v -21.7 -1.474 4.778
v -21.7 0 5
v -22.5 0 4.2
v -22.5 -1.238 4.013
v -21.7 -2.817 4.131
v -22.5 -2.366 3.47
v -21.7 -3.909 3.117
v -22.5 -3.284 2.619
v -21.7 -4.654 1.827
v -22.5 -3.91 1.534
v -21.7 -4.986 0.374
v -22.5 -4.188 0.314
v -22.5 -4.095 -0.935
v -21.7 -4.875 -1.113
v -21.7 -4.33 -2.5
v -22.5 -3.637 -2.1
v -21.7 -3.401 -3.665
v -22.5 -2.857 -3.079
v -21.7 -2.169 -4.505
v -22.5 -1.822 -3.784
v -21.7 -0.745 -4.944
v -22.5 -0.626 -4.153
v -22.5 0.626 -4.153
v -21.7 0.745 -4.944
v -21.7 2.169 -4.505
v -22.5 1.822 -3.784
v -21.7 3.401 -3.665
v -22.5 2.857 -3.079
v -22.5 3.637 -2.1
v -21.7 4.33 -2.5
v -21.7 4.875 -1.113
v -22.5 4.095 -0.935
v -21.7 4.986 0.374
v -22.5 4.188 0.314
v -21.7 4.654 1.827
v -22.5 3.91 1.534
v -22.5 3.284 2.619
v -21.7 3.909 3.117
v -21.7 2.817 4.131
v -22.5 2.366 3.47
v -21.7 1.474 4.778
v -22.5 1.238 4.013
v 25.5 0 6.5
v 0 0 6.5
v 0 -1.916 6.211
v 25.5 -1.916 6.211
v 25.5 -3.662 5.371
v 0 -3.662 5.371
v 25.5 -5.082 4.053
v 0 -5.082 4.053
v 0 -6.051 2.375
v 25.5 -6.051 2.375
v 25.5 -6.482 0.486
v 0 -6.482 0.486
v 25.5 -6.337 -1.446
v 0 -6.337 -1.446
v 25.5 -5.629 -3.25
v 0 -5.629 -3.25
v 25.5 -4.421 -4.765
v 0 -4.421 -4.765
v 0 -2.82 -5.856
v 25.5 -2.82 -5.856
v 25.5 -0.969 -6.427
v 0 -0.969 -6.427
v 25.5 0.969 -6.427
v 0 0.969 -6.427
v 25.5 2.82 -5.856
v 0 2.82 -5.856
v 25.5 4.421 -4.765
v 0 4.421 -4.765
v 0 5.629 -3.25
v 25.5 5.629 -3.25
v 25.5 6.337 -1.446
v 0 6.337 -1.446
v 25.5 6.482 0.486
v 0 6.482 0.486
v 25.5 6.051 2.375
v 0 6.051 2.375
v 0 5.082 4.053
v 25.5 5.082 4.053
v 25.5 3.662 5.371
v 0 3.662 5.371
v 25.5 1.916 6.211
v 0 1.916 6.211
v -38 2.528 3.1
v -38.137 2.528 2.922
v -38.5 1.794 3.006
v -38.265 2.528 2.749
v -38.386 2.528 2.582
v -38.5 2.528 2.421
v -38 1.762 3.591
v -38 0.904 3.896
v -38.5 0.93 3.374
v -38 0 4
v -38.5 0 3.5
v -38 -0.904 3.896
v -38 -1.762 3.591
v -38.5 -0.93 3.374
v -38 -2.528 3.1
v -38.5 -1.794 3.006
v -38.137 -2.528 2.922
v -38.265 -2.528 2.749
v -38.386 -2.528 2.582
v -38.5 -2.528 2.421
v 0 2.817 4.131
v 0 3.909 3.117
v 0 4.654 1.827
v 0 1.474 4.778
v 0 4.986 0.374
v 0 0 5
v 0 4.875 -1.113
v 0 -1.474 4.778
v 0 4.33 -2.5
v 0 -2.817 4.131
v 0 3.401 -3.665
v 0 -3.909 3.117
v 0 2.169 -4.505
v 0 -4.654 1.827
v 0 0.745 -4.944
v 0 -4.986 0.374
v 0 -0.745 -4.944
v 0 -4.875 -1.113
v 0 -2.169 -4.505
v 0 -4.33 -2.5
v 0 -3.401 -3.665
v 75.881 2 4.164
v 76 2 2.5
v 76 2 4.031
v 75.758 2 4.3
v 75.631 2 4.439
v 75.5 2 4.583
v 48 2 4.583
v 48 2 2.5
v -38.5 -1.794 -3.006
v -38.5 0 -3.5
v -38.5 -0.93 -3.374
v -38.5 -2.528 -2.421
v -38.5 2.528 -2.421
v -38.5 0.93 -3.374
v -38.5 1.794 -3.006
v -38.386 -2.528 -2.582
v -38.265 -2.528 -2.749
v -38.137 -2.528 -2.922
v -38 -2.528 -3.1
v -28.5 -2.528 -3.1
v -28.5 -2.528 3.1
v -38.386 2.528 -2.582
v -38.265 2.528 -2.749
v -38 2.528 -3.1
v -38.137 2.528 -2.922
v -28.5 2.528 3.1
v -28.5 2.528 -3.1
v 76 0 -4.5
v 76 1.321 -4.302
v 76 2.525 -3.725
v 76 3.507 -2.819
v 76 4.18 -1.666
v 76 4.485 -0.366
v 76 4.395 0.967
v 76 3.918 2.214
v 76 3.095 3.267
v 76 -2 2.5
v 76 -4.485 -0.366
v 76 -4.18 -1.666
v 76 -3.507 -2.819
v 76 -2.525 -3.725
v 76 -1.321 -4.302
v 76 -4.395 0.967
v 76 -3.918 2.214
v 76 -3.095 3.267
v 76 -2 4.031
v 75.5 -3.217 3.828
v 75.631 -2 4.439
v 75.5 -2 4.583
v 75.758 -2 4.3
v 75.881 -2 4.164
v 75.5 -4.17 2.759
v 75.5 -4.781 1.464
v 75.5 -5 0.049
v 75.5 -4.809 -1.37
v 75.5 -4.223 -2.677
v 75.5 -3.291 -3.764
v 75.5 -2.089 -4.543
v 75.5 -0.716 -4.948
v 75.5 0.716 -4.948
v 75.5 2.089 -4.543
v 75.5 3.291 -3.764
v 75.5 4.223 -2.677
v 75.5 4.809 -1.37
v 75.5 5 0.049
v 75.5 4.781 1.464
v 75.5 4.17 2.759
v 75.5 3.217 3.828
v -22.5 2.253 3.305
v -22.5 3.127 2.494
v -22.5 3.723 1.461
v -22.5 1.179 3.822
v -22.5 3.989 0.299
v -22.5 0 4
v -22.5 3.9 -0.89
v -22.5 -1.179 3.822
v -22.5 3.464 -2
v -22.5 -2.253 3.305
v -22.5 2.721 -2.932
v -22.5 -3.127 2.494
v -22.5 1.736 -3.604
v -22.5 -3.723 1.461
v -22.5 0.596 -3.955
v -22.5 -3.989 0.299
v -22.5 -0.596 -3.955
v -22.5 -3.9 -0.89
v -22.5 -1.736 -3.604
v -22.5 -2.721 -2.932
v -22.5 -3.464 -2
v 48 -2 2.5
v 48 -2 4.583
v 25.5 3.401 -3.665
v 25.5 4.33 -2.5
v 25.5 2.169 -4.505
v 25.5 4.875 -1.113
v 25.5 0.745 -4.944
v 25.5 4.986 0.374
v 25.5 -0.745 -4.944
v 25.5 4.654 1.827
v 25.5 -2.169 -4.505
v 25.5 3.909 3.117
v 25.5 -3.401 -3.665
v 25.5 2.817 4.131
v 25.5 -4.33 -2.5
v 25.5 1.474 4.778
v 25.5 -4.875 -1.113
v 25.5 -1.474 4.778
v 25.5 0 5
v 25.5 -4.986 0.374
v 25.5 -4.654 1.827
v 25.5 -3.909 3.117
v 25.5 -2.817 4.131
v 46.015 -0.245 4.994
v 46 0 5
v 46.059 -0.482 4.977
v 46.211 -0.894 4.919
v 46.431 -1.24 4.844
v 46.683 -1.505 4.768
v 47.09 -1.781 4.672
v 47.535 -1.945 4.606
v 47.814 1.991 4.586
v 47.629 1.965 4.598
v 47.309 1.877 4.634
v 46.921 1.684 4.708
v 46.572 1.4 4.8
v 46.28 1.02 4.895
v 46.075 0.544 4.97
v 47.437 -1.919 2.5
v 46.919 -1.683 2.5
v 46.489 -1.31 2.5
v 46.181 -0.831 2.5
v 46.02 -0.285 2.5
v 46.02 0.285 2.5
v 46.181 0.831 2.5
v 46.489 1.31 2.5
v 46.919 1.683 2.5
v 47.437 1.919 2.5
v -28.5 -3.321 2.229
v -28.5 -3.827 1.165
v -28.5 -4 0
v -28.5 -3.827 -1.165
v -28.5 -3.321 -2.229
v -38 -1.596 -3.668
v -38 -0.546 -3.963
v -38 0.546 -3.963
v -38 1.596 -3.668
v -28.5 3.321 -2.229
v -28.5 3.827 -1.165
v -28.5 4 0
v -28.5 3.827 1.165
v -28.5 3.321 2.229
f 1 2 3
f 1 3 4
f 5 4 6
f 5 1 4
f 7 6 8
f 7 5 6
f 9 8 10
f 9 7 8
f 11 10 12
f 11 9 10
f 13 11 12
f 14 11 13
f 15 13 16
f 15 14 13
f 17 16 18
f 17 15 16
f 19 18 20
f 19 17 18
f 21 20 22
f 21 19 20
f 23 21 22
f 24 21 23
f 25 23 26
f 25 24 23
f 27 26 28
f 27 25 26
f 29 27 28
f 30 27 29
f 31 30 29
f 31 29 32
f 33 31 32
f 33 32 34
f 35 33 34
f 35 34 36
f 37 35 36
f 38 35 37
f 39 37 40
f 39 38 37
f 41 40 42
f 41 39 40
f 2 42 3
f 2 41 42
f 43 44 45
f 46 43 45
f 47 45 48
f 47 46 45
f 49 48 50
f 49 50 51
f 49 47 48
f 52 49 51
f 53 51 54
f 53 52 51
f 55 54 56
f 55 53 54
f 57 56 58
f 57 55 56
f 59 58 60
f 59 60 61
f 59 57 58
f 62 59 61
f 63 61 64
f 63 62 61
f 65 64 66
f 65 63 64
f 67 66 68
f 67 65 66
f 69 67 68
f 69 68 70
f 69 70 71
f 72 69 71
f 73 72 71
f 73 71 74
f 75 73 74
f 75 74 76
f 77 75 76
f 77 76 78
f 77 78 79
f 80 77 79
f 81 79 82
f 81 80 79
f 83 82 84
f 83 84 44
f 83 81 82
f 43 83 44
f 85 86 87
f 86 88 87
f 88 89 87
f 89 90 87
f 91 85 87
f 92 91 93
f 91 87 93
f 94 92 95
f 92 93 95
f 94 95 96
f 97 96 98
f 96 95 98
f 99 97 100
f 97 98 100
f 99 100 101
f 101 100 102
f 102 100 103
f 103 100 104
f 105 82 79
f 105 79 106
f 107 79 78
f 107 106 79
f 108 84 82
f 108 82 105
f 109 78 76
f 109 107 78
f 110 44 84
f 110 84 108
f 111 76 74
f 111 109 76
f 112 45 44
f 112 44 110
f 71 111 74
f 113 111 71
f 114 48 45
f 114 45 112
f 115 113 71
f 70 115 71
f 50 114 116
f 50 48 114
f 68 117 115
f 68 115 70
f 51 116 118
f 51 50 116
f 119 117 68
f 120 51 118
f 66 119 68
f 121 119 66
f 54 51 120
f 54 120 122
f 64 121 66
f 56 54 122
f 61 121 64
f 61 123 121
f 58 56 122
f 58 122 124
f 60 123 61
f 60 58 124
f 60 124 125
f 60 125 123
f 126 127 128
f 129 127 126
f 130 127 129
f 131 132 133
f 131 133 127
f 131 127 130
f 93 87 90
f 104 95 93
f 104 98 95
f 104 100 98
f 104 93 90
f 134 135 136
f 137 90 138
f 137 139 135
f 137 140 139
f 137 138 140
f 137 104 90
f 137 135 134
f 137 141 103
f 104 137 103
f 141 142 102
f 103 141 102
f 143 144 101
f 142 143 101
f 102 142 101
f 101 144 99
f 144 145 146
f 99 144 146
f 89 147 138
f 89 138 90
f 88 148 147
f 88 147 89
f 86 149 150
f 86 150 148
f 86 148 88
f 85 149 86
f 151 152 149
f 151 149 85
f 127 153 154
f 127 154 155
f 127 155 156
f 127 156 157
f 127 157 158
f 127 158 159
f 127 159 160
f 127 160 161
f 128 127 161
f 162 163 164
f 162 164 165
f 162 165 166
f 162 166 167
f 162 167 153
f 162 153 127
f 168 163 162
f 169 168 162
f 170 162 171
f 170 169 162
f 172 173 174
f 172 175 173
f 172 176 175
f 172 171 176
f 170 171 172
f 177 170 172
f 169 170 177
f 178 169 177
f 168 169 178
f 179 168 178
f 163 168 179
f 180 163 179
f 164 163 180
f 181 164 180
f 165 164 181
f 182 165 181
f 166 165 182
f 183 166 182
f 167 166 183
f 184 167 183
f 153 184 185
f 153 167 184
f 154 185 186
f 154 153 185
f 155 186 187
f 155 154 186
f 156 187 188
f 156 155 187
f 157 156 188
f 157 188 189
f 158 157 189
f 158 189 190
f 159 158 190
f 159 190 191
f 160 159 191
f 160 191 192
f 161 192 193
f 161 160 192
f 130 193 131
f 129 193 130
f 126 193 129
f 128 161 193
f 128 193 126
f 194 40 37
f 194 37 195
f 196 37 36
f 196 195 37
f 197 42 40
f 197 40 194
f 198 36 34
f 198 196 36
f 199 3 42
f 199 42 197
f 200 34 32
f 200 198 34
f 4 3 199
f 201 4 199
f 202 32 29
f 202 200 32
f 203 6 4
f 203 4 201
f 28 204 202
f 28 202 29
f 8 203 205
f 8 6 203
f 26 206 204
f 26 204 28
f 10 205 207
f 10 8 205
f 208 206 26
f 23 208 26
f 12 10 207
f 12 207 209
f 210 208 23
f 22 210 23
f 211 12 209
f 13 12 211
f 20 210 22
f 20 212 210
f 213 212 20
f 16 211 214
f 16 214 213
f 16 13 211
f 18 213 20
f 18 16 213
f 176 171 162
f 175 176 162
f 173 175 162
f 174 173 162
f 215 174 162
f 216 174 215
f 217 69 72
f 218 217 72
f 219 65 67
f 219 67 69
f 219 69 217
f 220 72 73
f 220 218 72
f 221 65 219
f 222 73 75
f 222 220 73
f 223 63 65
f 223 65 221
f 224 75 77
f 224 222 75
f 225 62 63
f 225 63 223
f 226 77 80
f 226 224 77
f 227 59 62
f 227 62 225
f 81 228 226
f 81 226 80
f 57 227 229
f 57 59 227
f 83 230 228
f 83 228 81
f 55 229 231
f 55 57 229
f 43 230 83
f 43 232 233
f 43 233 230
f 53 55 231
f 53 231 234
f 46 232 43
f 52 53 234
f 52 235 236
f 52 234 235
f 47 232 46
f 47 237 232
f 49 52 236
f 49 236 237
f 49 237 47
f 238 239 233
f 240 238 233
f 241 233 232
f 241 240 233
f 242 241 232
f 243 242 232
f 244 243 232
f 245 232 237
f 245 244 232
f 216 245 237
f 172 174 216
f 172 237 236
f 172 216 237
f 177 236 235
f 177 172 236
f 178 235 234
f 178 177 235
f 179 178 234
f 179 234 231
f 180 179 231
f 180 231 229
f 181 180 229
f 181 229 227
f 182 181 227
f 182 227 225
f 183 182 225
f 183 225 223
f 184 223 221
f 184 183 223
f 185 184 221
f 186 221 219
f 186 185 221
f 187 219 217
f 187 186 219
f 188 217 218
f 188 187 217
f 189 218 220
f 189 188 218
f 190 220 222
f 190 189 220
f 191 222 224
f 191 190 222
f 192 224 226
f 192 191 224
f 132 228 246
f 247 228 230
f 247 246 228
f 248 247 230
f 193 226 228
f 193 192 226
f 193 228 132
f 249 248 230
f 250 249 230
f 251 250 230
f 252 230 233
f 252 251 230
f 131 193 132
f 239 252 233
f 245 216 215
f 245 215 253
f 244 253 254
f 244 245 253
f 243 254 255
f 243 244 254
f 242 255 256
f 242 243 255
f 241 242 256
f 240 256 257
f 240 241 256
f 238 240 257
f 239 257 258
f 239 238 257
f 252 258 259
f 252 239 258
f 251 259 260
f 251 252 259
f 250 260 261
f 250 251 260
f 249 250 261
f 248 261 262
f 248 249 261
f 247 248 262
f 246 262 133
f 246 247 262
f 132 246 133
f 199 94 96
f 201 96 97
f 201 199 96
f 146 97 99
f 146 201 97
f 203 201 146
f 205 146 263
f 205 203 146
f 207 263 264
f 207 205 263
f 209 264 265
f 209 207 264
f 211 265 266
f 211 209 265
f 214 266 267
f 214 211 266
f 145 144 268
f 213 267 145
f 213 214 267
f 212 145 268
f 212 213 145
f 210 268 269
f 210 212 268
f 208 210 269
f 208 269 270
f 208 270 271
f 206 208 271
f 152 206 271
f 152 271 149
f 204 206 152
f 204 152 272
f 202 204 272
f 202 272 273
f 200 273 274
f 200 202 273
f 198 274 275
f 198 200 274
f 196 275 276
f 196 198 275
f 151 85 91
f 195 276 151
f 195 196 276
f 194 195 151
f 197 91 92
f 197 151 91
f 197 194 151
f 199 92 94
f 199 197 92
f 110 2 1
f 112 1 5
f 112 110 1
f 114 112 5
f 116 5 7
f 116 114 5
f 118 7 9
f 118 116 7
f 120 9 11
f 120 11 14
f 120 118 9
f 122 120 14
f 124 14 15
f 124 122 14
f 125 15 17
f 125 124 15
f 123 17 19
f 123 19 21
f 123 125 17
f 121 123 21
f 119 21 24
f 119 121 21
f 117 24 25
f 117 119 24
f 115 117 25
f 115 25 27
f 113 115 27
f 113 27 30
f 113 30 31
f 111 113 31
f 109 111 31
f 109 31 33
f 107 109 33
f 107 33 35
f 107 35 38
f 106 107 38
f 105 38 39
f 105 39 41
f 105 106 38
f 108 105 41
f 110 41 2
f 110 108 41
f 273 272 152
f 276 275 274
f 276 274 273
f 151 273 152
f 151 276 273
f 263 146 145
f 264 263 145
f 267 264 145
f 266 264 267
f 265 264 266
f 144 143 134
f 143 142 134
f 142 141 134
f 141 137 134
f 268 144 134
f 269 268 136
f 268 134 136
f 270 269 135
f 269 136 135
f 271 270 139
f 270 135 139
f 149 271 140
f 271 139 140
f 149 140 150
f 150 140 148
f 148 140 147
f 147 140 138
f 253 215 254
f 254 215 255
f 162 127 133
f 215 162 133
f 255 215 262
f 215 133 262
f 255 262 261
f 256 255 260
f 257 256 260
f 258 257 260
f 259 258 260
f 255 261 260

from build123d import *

# Parameters (mm, degrees)
CUT_EXTRUDE1_START = -10
CUT_EXTRUDE1_DEPTH = 10
CUT_EXTRUDE2_DEPTH = 2.5
CHAMFER1_SIZE      = 0.8
CHAMFER2_SIZE      = 0.5


with BuildPart() as part:
    # Sketch1 → Revolve1 (revolve)
    with BuildSketch(Plane.XY, mode=Mode.PRIVATE) as revolve1_sk:
        Polygon((-38.5, 0), (-38.5, 4), (-22.5, 4), (-22.5, 5), (0, 5), (0, 6.5), (25.5, 6.5), (25.5, 5), (76, 5), (76, 0), align=None)
    revolve(revolve1_sk.sketch.rotate(Axis((-44.194465138, 0, 0), (1, 0, 0)), 90), axis=Axis((-44.194465138, 0, 0), (1, 0, 0)))

    # Sketch2 → Cut-Extrude1 (cut)
    with BuildSketch(Plane.ZY.offset(38.5).offset(CUT_EXTRUDE1_START)):
        with BuildLine():
            Line((-3.1, -2.527844932), (3.1, -2.527844932))
            ThreePointArc((3.1, -2.527844932), (0, -4), (-3.1, -2.527844932))
        make_face()
        with BuildLine():
            Line((-3.1, 2.527844932), (3.1, 2.527844932))
            ThreePointArc((3.1, 2.527844932), (0, 4), (-3.1, 2.527844932))
        make_face()
    extrude(amount=CUT_EXTRUDE1_DEPTH, mode=Mode.SUBTRACT)

    # Sketch3 → Cut-Extrude2 (cut)
    with BuildSketch(Plane.XY.offset(5)):
        with BuildLine():
            Line((76, -2), (48, -2))
            ThreePointArc((48, -2), (46, 0), (48, 2))
            Line((48, 2), (76, 2))
            ThreePointArc((76, 2), (78, 0), (76, -2))
        make_face()
    extrude(amount=-CUT_EXTRUDE2_DEPTH, mode=Mode.SUBTRACT)

    # Chamfer1
    chamfer1_edges = [part.edges().sort_by_distance(p)[0] for p in [
        (-22.5, 0, -5),
    ]]
    chamfer(chamfer1_edges, length=CHAMFER1_SIZE)

    # Chamfer2
    chamfer2_edges = [part.edges().sort_by_distance(p)[0] for p in [
        (-38.5, -1.341640786, 3.768288736),
        (-38.5, 0, -4),
        (76, 0, -5),
    ]]
    chamfer(chamfer2_edges, length=CHAMFER2_SIZE)


solid = part.part
